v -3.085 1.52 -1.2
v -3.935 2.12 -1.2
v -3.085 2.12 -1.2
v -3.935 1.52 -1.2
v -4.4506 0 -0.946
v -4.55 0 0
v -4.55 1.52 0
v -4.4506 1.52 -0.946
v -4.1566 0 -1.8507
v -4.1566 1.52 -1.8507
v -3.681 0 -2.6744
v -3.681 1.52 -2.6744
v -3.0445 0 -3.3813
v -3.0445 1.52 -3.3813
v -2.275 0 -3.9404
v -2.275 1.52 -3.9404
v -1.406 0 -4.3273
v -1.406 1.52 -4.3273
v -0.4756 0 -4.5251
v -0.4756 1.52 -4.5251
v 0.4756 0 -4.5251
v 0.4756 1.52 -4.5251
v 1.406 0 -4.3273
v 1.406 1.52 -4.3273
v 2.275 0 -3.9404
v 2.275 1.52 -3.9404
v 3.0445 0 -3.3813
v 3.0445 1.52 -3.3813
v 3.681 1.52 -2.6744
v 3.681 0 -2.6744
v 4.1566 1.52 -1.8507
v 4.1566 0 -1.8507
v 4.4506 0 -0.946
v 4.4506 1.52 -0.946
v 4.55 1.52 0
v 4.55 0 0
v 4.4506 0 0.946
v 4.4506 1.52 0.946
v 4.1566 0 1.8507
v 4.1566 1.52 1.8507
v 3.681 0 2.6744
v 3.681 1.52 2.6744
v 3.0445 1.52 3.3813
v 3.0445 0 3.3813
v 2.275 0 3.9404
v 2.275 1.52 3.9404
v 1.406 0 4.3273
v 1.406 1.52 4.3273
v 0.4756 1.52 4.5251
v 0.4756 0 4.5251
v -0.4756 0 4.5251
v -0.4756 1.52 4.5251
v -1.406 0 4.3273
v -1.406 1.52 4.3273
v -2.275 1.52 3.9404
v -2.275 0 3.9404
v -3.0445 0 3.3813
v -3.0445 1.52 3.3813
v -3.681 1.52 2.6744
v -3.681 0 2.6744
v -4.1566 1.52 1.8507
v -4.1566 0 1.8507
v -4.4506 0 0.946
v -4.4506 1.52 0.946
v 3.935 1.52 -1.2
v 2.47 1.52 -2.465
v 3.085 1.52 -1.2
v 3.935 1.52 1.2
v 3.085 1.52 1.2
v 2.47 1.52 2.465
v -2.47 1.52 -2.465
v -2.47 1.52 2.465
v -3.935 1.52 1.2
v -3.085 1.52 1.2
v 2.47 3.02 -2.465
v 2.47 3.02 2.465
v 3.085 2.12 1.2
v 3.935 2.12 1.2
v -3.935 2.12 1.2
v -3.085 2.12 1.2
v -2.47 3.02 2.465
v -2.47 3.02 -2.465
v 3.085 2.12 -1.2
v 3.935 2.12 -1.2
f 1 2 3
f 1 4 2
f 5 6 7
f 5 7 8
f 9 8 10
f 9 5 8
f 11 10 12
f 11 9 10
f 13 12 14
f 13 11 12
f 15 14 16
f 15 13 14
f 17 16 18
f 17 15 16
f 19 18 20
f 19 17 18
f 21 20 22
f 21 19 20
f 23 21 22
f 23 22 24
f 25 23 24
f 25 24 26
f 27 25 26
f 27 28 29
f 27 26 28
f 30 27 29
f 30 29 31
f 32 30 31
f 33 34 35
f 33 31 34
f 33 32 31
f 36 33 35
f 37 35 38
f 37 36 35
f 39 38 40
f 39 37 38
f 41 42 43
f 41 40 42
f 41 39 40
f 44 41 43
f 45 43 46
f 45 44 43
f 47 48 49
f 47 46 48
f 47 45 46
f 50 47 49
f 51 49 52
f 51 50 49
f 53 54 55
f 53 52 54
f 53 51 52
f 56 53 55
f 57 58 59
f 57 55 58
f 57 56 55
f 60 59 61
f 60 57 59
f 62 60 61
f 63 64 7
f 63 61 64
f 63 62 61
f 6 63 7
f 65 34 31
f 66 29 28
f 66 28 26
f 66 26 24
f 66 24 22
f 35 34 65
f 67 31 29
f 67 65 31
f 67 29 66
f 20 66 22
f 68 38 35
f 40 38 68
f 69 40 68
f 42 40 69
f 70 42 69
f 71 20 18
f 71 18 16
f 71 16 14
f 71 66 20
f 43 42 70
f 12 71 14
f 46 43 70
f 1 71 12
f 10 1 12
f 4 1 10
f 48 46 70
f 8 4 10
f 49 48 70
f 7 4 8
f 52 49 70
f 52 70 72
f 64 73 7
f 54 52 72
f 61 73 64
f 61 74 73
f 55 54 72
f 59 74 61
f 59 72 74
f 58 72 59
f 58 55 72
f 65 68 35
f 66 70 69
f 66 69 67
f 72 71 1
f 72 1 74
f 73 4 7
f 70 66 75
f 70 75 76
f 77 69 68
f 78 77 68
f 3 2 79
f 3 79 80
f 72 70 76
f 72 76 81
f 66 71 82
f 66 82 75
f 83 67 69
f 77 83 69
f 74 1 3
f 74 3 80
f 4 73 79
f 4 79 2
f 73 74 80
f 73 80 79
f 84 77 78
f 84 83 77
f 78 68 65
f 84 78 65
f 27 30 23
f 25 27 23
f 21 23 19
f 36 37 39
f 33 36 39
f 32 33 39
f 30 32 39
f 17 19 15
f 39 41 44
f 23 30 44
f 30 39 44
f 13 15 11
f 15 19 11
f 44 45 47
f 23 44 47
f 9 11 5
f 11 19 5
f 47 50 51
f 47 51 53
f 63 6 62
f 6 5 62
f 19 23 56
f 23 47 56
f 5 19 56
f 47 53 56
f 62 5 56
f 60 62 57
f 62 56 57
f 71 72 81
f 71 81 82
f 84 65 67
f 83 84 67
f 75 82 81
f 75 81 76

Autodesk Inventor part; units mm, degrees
ref_plane "YZ Plane" through (0, 0, 0) normal (1, 0, 0) x (0, 1, 0)
ref_plane "XZ Plane" through (0, 0, 0) normal (0, 1, 0) x (-1, 0, 0)
ref_plane "XY Plane" through (0, 0, 0) normal (0, 0, 1) x (1, 0, 0)
sketch "Sketch1" plane through (0, 0, 0) normal (0, 1, 0) x (-1, 0, 0)
  circle A0 centre (0, 0) radius 4.55
  dimension "d0" = 9.1
extrude "Extrusion1" add sketch "Sketch1" along normal blind 1.52
sketch "Sketch2" plane through (0, 1.52, 0) normal (0, 1, 0) x (1, 0, 0)
  line L0 (2.47, -2.465) -> (-2.47, -2.465)
  line L1 (-2.47, -2.465) -> (-2.47, 2.465)
  line L2 (-2.47, 2.465) -> (2.47, 2.465)
  line L3 (2.47, 2.465) -> (2.47, -2.465)
  line L4 (2.47, -2.465) -> (-2.47, 2.465) construction
  line L5 (-2.47, -2.465) -> (2.47, 2.465) construction
  point P0 (0, 0)
  dimension "d3" = 4.94
  dimension "d4" = 4.93
extrude "Extrusion2" add sketch "Sketch2" along normal blind 1.5
sketch "Sketch3" plane through (0, 1.52, 0) normal (0, 1, 0) x (1, 0, 0)
  line L0 (3.935, 1.2) -> (3.085, 1.2)
  line L1 (3.085, 1.2) -> (3.085, -1.2)
  line L2 (3.085, -1.2) -> (3.935, -1.2)
  line L3 (3.935, -1.2) -> (3.935, 1.2)
  line L4 (2.47, -2.465) -> (2.47, 2.465) projected
  circle A0 centre (0, 0) radius 4.55 projected
  line L5 (0, 4.55) -> (0, -4.55) construction
  line L6 (-3.935, 1.2) -> (-3.085, 1.2)
  line L7 (-3.085, 1.2) -> (-3.085, -1.2)
  line L8 (-3.085, -1.2) -> (-3.935, -1.2)
  line L9 (-3.935, -1.2) -> (-3.935, 1.2)
  dimension "d7" = 2.4
  dimension "d8" = 0.85
  dimension "d9" = 0.615
  dimension "d10" = 0.615
  dimension "d11" = 1.2
  dimension "d12" = 1.2
extrude "Extrusion3" add sketch "Sketch3" along normal blind 0.6 contours L3 L2 L1 L0 | L6 L7 L8 L9
equation "\"d9\" = d10"
equation "\"d11\" = d12"
properties part number "neopixel mini pcb footprint"
